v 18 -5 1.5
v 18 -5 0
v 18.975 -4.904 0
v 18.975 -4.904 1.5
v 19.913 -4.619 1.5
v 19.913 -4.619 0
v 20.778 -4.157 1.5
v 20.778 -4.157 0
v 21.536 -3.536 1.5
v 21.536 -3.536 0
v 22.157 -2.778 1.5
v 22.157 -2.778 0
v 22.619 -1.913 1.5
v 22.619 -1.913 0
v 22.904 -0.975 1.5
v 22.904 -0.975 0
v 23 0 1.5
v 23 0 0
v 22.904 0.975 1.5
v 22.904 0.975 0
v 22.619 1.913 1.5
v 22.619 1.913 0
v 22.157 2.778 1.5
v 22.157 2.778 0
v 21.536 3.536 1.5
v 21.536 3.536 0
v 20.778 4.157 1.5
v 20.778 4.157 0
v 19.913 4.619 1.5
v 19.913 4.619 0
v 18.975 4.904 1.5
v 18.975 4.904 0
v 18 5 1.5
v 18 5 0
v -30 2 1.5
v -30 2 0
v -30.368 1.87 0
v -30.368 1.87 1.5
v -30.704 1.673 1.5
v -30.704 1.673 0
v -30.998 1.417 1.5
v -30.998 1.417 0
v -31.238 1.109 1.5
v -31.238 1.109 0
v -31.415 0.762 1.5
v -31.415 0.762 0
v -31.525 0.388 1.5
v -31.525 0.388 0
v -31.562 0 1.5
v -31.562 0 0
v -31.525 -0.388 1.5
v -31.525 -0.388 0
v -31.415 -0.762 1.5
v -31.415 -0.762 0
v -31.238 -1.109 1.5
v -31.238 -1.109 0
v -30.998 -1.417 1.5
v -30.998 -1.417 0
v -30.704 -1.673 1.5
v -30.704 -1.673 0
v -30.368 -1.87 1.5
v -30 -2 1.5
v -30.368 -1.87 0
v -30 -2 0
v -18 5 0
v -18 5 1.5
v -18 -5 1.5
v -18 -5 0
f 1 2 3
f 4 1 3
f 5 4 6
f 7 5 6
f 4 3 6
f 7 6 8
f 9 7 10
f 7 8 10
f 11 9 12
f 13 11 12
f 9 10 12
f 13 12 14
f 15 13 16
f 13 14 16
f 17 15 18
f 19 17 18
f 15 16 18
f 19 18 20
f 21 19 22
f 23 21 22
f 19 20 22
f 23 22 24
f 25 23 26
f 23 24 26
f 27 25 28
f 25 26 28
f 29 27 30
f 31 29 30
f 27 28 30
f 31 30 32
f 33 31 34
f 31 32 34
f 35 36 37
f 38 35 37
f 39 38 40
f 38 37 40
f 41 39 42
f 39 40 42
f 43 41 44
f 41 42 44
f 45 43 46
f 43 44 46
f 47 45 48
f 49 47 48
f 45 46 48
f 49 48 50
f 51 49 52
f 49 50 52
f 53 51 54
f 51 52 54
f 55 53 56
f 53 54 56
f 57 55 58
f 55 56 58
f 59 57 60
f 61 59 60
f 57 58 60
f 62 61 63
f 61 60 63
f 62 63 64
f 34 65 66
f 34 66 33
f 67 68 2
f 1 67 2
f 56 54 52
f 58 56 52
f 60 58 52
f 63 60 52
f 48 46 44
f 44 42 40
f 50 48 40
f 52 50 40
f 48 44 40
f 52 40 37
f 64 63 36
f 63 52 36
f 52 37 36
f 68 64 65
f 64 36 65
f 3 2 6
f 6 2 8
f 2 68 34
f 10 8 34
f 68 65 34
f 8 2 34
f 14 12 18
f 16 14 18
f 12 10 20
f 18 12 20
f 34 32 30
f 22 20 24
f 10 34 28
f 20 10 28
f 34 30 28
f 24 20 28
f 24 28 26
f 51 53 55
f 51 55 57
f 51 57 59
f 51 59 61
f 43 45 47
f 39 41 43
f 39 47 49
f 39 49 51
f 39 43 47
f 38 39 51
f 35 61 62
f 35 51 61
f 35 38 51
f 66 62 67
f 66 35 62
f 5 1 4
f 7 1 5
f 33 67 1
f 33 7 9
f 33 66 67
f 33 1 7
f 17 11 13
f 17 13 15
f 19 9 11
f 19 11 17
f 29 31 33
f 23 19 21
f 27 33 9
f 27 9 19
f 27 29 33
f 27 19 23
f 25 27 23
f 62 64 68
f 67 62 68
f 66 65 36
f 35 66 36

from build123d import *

# Parameters (mm, degrees)
F0_W     = 36
F0_H     = 10
F1_DEPTH = 1.5


with BuildPart() as f1:
    # F0 (on Top) → F1 (new body)
    with BuildSketch(Plane.XY):
        Rectangle(F0_W, F0_H)
        with BuildLine():
            Line((18, 5), (18, -5))
            ThreePointArc((18, -5), (23, 0), (18, 5))
        make_face()
        with BuildLine():
            Line((-30, -2), (-18, -5))
            Line((-18, -5), (-18, 5))
            Line((-18, 5), (-30, 2))
            ThreePointArc((-30, 2), (-31.561553, 0), (-30, -2))
        make_face()
    extrude(amount=F1_DEPTH)


solid = f1.part
